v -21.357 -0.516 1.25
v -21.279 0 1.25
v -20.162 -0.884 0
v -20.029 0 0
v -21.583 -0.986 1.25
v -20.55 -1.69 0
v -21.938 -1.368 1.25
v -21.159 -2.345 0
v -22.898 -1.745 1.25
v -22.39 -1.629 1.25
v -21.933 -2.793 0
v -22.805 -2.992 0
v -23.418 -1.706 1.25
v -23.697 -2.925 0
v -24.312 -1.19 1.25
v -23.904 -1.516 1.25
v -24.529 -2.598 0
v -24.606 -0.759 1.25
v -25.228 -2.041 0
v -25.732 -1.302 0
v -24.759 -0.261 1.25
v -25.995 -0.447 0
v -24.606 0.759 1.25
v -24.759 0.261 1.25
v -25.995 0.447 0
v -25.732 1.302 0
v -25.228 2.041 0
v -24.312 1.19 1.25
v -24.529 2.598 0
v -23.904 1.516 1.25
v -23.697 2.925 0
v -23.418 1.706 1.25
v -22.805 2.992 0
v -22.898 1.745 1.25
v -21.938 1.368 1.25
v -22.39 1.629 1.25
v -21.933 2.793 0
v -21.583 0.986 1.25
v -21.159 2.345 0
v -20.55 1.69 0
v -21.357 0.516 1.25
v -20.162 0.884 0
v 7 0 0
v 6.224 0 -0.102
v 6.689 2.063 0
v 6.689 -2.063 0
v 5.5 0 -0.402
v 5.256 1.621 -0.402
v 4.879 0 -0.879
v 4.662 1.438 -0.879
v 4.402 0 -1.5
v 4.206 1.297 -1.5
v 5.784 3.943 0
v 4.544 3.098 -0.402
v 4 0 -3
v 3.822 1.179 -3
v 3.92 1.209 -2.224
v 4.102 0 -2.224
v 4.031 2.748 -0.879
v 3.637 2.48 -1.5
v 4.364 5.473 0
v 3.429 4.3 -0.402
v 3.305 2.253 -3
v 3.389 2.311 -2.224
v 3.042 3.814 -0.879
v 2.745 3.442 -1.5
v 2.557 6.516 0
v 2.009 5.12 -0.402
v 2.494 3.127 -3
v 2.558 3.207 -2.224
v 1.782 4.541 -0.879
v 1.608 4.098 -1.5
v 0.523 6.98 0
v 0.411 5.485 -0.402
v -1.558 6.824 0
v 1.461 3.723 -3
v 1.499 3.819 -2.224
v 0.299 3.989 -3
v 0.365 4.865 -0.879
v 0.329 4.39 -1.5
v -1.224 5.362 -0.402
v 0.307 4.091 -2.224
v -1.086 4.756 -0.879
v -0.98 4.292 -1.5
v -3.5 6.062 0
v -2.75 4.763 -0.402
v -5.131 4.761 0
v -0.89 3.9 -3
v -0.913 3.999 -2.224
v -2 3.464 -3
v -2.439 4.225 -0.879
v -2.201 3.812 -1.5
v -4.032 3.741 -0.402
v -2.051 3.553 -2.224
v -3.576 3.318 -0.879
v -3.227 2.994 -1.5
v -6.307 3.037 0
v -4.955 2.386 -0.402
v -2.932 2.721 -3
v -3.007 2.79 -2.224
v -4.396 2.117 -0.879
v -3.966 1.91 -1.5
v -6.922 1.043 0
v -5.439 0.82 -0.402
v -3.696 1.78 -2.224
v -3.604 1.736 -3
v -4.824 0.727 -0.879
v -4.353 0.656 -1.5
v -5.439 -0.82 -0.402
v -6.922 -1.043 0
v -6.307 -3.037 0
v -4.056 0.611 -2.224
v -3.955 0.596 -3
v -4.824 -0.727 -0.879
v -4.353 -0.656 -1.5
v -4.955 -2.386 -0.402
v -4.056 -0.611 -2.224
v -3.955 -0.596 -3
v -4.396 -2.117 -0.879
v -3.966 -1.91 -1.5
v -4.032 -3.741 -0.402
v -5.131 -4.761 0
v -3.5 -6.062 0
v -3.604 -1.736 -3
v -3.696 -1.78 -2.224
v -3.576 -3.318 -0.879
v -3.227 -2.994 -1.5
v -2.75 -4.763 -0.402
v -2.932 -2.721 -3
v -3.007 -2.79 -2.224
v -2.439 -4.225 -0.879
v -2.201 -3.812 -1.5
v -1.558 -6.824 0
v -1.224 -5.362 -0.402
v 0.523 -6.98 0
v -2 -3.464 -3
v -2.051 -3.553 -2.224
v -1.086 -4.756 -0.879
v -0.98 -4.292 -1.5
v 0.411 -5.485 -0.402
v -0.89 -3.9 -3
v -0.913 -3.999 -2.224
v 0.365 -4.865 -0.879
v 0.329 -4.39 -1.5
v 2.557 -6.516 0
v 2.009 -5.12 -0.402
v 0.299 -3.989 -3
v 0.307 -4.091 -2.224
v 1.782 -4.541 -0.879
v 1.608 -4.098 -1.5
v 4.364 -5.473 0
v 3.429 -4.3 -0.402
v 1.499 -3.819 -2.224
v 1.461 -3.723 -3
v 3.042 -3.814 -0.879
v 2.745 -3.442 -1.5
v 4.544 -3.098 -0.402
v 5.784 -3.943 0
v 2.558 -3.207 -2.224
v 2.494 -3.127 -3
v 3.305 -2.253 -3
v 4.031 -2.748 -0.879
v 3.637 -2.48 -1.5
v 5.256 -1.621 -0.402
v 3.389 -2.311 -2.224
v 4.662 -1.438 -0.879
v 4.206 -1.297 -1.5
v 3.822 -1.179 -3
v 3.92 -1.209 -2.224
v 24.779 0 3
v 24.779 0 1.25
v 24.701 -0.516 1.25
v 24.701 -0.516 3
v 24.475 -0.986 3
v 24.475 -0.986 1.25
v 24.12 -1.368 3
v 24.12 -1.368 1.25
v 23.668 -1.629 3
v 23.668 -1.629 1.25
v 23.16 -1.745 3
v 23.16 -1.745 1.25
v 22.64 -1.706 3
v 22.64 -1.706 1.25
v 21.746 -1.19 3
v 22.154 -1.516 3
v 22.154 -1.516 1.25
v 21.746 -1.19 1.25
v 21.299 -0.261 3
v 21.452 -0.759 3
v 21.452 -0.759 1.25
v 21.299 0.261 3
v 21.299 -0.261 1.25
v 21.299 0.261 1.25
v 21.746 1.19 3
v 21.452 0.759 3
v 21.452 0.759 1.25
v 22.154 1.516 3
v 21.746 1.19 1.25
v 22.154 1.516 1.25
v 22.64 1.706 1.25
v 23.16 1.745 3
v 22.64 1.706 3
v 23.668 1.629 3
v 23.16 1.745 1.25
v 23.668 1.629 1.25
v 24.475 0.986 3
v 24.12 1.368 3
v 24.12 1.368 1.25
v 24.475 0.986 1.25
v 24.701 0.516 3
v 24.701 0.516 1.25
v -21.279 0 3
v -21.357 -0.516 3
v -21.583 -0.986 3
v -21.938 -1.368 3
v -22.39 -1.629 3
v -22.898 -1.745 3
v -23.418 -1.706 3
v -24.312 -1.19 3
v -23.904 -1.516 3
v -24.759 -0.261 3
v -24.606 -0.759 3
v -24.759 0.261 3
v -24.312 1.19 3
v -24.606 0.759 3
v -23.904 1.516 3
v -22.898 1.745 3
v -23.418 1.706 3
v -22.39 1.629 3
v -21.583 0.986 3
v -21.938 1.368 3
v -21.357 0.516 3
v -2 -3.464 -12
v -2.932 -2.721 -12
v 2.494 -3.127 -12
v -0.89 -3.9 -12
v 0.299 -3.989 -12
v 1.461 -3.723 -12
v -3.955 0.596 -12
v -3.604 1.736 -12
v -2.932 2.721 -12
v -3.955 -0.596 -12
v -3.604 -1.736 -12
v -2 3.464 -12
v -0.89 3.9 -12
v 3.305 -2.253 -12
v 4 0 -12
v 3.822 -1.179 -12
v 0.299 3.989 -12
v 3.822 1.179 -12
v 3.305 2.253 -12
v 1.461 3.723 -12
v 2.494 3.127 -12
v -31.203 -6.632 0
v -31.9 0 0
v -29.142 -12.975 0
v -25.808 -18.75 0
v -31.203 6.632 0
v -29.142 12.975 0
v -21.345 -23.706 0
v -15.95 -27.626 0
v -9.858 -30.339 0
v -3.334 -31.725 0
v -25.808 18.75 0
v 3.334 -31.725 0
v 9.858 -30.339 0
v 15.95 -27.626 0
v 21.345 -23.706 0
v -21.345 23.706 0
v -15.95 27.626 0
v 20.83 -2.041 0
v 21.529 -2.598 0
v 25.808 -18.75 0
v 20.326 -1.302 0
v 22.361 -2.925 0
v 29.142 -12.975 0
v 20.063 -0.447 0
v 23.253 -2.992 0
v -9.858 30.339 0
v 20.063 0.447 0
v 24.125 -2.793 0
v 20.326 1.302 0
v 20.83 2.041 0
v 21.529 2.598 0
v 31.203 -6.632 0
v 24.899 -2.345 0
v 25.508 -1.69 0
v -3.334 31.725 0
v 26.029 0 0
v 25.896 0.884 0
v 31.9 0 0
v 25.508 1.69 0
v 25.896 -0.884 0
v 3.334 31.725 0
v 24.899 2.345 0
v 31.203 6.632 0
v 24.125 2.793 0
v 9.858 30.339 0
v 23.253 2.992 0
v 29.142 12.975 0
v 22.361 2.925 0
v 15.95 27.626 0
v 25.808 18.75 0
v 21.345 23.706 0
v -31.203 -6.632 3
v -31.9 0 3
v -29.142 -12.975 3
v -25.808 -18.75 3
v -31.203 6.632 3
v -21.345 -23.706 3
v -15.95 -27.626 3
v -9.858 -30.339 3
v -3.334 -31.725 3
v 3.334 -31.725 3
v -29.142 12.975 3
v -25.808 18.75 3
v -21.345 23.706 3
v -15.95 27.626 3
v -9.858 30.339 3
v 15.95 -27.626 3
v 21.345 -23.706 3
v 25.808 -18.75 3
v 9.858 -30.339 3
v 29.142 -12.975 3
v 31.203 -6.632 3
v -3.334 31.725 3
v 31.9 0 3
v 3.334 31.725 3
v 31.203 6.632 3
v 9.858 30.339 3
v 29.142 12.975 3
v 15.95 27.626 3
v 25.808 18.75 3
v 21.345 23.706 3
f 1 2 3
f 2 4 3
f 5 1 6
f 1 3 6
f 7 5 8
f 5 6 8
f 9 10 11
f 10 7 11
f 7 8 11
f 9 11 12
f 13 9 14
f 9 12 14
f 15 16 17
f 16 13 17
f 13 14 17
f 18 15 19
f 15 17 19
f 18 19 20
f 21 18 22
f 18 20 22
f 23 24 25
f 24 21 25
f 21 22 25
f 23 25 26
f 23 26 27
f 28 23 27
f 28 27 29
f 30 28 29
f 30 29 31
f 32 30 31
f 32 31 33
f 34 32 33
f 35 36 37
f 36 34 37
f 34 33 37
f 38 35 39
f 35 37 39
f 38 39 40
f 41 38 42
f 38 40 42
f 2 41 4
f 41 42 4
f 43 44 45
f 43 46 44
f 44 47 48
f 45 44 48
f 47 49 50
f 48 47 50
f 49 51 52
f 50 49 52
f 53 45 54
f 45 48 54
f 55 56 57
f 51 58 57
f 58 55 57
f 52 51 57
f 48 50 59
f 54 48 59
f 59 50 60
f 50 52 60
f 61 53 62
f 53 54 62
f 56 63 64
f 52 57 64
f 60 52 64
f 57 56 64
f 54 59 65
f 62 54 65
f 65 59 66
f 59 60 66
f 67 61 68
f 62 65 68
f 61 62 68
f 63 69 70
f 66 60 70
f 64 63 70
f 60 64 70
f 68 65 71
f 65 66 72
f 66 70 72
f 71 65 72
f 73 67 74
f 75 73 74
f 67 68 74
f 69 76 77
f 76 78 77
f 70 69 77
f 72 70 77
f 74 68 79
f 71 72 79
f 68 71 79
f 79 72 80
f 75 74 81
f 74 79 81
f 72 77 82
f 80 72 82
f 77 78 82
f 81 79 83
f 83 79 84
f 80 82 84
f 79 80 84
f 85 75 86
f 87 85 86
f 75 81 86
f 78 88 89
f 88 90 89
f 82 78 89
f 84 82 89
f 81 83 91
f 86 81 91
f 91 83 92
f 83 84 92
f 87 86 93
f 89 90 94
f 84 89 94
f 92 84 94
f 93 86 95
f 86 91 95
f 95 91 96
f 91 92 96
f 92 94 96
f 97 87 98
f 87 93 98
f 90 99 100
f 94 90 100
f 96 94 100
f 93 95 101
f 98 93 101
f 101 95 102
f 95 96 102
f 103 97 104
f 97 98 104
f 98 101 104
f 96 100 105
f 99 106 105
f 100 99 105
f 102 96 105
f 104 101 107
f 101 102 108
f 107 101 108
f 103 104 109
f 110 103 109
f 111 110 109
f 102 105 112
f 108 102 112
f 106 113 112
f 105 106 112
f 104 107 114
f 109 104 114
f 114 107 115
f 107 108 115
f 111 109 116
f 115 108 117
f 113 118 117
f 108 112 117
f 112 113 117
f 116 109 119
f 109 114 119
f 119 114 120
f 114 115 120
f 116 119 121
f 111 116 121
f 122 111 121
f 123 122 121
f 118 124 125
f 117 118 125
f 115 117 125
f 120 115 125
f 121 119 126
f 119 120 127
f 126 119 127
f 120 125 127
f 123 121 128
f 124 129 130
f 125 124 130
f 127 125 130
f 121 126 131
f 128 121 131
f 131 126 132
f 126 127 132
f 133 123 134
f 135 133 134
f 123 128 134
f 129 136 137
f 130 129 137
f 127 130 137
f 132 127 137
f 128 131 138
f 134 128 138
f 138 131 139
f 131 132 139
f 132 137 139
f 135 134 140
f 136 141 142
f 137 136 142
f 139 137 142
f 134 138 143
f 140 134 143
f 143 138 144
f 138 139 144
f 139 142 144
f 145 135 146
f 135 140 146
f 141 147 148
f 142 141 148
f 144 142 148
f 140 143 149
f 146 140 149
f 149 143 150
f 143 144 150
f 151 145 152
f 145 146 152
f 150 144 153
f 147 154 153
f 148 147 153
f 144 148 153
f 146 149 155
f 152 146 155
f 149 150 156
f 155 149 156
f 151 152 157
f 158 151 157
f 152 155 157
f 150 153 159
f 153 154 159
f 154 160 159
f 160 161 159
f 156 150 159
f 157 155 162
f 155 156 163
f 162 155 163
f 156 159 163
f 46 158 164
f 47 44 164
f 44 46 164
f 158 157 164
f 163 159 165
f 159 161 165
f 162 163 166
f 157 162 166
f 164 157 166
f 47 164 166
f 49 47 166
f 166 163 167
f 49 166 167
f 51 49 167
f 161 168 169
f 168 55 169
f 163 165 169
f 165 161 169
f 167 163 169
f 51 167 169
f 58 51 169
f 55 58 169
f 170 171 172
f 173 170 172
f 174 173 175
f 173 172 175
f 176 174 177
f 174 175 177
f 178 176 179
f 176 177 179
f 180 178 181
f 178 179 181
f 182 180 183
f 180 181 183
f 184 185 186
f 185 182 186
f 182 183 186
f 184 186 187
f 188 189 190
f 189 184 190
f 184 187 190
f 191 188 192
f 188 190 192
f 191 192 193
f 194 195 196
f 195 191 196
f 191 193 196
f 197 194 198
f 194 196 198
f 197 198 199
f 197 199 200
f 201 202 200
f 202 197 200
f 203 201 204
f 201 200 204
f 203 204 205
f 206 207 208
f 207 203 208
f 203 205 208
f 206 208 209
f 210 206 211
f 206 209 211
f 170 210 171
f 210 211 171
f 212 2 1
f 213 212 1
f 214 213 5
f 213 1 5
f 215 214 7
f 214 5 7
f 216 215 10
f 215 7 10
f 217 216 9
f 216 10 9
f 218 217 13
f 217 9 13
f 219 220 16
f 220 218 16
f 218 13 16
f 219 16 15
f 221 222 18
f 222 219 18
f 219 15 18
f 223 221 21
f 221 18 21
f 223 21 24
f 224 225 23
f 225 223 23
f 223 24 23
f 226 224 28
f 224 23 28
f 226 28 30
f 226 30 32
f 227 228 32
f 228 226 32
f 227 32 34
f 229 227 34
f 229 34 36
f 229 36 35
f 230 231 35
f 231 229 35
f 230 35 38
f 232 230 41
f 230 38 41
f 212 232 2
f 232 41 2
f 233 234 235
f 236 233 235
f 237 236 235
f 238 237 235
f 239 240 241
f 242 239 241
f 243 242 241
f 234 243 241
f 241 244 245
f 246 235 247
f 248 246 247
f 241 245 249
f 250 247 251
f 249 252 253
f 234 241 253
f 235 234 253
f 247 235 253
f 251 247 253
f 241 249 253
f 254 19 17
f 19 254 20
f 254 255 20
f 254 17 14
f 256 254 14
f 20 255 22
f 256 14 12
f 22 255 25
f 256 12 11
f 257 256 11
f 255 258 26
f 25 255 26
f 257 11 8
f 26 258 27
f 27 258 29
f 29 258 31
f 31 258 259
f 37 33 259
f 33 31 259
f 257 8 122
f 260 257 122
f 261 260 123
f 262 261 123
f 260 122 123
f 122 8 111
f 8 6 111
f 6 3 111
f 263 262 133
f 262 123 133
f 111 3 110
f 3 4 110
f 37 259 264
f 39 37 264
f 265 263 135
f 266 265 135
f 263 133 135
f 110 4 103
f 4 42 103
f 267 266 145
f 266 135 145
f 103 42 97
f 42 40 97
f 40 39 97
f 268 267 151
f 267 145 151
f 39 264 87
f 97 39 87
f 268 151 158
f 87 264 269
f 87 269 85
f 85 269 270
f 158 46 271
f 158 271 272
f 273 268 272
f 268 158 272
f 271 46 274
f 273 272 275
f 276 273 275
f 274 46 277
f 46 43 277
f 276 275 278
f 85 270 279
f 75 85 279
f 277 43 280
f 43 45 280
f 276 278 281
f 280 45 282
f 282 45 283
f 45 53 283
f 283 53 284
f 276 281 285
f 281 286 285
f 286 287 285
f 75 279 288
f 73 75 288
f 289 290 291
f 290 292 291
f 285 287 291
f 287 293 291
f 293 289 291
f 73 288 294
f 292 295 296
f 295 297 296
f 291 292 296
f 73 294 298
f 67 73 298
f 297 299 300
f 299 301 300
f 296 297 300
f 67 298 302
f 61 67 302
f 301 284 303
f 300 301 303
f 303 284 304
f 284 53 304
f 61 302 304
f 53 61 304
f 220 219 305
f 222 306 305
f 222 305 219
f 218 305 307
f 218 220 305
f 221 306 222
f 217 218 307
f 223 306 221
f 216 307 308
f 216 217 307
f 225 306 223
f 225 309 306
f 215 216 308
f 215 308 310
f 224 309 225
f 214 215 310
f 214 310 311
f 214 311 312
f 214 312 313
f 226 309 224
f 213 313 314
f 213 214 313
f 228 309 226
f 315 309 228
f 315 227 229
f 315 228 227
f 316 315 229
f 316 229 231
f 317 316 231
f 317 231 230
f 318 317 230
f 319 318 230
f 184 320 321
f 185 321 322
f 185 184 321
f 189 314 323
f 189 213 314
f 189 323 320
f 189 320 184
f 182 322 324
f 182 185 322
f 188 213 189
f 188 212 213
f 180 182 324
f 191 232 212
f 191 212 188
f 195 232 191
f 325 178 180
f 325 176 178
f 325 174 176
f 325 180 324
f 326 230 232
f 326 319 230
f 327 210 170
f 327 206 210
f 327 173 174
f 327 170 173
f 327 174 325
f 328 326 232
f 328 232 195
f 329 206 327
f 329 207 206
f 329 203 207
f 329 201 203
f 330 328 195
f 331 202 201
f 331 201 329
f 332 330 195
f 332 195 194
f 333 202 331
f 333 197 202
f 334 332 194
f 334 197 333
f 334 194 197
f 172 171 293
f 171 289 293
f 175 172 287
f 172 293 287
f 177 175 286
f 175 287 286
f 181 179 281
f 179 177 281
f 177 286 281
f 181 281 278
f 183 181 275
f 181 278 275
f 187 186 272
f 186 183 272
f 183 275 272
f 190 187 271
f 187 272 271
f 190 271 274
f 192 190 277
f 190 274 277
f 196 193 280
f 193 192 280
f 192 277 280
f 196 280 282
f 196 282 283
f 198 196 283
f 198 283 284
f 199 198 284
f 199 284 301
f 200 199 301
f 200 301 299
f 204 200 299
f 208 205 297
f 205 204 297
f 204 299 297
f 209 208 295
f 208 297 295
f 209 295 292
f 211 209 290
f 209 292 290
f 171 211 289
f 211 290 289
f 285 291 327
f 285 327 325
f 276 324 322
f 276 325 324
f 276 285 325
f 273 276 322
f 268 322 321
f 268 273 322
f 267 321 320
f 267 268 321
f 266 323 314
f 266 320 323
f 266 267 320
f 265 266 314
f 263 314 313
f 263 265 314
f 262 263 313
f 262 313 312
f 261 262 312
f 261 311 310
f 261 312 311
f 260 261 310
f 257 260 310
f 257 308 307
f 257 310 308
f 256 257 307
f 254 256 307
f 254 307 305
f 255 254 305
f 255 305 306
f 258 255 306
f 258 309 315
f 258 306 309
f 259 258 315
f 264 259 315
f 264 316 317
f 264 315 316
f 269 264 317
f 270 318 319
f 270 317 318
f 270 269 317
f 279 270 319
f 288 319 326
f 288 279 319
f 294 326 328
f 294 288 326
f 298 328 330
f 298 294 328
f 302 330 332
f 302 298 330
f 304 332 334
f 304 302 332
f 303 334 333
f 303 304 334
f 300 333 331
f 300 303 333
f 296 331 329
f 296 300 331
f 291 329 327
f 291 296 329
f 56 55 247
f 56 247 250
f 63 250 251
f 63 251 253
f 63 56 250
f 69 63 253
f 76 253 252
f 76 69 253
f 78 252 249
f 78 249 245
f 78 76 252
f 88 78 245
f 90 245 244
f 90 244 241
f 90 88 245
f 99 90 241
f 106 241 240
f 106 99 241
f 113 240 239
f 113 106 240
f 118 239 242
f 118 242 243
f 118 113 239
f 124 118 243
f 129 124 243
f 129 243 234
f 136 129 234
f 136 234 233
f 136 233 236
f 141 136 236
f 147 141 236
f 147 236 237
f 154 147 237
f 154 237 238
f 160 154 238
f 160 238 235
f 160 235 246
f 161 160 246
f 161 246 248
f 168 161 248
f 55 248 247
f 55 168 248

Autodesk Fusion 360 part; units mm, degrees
sketch "Sketch1" plane through (0, 0, 0) normal (0, 0, 1) x (1, 0, 0)
  circle A0 centre (0, 0) radius 31.9
  line L0 (0, 0) -> (-31.9, 0) construction
  line L1 (0, 0) -> (31.9, 0) construction
  circle A1 centre (23.029, 0) radius 1.75
  circle A2 centre (-23.029, 0) radius 1.75
  circle A3 centre (-23.029, 0) radius 3
  circle A4 centre (23.029, 0) radius 3
  circle A5 centre (0, 0) radius 4
  dimension "d1" = 63.8
  dimension "d2" = 3.5
  dimension "d3" = 23.029
  dimension "d4" = 3.5
  dimension "d5" = 23.029
  dimension "d6" = 6
  dimension "d7" = 6
  dimension "d8" = 8
extrude "Extrude1" add sketch "Sketch1" along normal blind 3 contours A0 | A3 | A4 | A5
extrude "Extrude3" add sketch "Sketch1" against normal blind 12 contours A5
fillet "Fillet2" radius 3 1 edges at (-3.7293, -1.4465, 0)
chamfer "Chamfer2" distance 1.25 angle 45 2 edges at (21.3974, 0.6328, 0) (-24.6606, 0.6328, 0)
